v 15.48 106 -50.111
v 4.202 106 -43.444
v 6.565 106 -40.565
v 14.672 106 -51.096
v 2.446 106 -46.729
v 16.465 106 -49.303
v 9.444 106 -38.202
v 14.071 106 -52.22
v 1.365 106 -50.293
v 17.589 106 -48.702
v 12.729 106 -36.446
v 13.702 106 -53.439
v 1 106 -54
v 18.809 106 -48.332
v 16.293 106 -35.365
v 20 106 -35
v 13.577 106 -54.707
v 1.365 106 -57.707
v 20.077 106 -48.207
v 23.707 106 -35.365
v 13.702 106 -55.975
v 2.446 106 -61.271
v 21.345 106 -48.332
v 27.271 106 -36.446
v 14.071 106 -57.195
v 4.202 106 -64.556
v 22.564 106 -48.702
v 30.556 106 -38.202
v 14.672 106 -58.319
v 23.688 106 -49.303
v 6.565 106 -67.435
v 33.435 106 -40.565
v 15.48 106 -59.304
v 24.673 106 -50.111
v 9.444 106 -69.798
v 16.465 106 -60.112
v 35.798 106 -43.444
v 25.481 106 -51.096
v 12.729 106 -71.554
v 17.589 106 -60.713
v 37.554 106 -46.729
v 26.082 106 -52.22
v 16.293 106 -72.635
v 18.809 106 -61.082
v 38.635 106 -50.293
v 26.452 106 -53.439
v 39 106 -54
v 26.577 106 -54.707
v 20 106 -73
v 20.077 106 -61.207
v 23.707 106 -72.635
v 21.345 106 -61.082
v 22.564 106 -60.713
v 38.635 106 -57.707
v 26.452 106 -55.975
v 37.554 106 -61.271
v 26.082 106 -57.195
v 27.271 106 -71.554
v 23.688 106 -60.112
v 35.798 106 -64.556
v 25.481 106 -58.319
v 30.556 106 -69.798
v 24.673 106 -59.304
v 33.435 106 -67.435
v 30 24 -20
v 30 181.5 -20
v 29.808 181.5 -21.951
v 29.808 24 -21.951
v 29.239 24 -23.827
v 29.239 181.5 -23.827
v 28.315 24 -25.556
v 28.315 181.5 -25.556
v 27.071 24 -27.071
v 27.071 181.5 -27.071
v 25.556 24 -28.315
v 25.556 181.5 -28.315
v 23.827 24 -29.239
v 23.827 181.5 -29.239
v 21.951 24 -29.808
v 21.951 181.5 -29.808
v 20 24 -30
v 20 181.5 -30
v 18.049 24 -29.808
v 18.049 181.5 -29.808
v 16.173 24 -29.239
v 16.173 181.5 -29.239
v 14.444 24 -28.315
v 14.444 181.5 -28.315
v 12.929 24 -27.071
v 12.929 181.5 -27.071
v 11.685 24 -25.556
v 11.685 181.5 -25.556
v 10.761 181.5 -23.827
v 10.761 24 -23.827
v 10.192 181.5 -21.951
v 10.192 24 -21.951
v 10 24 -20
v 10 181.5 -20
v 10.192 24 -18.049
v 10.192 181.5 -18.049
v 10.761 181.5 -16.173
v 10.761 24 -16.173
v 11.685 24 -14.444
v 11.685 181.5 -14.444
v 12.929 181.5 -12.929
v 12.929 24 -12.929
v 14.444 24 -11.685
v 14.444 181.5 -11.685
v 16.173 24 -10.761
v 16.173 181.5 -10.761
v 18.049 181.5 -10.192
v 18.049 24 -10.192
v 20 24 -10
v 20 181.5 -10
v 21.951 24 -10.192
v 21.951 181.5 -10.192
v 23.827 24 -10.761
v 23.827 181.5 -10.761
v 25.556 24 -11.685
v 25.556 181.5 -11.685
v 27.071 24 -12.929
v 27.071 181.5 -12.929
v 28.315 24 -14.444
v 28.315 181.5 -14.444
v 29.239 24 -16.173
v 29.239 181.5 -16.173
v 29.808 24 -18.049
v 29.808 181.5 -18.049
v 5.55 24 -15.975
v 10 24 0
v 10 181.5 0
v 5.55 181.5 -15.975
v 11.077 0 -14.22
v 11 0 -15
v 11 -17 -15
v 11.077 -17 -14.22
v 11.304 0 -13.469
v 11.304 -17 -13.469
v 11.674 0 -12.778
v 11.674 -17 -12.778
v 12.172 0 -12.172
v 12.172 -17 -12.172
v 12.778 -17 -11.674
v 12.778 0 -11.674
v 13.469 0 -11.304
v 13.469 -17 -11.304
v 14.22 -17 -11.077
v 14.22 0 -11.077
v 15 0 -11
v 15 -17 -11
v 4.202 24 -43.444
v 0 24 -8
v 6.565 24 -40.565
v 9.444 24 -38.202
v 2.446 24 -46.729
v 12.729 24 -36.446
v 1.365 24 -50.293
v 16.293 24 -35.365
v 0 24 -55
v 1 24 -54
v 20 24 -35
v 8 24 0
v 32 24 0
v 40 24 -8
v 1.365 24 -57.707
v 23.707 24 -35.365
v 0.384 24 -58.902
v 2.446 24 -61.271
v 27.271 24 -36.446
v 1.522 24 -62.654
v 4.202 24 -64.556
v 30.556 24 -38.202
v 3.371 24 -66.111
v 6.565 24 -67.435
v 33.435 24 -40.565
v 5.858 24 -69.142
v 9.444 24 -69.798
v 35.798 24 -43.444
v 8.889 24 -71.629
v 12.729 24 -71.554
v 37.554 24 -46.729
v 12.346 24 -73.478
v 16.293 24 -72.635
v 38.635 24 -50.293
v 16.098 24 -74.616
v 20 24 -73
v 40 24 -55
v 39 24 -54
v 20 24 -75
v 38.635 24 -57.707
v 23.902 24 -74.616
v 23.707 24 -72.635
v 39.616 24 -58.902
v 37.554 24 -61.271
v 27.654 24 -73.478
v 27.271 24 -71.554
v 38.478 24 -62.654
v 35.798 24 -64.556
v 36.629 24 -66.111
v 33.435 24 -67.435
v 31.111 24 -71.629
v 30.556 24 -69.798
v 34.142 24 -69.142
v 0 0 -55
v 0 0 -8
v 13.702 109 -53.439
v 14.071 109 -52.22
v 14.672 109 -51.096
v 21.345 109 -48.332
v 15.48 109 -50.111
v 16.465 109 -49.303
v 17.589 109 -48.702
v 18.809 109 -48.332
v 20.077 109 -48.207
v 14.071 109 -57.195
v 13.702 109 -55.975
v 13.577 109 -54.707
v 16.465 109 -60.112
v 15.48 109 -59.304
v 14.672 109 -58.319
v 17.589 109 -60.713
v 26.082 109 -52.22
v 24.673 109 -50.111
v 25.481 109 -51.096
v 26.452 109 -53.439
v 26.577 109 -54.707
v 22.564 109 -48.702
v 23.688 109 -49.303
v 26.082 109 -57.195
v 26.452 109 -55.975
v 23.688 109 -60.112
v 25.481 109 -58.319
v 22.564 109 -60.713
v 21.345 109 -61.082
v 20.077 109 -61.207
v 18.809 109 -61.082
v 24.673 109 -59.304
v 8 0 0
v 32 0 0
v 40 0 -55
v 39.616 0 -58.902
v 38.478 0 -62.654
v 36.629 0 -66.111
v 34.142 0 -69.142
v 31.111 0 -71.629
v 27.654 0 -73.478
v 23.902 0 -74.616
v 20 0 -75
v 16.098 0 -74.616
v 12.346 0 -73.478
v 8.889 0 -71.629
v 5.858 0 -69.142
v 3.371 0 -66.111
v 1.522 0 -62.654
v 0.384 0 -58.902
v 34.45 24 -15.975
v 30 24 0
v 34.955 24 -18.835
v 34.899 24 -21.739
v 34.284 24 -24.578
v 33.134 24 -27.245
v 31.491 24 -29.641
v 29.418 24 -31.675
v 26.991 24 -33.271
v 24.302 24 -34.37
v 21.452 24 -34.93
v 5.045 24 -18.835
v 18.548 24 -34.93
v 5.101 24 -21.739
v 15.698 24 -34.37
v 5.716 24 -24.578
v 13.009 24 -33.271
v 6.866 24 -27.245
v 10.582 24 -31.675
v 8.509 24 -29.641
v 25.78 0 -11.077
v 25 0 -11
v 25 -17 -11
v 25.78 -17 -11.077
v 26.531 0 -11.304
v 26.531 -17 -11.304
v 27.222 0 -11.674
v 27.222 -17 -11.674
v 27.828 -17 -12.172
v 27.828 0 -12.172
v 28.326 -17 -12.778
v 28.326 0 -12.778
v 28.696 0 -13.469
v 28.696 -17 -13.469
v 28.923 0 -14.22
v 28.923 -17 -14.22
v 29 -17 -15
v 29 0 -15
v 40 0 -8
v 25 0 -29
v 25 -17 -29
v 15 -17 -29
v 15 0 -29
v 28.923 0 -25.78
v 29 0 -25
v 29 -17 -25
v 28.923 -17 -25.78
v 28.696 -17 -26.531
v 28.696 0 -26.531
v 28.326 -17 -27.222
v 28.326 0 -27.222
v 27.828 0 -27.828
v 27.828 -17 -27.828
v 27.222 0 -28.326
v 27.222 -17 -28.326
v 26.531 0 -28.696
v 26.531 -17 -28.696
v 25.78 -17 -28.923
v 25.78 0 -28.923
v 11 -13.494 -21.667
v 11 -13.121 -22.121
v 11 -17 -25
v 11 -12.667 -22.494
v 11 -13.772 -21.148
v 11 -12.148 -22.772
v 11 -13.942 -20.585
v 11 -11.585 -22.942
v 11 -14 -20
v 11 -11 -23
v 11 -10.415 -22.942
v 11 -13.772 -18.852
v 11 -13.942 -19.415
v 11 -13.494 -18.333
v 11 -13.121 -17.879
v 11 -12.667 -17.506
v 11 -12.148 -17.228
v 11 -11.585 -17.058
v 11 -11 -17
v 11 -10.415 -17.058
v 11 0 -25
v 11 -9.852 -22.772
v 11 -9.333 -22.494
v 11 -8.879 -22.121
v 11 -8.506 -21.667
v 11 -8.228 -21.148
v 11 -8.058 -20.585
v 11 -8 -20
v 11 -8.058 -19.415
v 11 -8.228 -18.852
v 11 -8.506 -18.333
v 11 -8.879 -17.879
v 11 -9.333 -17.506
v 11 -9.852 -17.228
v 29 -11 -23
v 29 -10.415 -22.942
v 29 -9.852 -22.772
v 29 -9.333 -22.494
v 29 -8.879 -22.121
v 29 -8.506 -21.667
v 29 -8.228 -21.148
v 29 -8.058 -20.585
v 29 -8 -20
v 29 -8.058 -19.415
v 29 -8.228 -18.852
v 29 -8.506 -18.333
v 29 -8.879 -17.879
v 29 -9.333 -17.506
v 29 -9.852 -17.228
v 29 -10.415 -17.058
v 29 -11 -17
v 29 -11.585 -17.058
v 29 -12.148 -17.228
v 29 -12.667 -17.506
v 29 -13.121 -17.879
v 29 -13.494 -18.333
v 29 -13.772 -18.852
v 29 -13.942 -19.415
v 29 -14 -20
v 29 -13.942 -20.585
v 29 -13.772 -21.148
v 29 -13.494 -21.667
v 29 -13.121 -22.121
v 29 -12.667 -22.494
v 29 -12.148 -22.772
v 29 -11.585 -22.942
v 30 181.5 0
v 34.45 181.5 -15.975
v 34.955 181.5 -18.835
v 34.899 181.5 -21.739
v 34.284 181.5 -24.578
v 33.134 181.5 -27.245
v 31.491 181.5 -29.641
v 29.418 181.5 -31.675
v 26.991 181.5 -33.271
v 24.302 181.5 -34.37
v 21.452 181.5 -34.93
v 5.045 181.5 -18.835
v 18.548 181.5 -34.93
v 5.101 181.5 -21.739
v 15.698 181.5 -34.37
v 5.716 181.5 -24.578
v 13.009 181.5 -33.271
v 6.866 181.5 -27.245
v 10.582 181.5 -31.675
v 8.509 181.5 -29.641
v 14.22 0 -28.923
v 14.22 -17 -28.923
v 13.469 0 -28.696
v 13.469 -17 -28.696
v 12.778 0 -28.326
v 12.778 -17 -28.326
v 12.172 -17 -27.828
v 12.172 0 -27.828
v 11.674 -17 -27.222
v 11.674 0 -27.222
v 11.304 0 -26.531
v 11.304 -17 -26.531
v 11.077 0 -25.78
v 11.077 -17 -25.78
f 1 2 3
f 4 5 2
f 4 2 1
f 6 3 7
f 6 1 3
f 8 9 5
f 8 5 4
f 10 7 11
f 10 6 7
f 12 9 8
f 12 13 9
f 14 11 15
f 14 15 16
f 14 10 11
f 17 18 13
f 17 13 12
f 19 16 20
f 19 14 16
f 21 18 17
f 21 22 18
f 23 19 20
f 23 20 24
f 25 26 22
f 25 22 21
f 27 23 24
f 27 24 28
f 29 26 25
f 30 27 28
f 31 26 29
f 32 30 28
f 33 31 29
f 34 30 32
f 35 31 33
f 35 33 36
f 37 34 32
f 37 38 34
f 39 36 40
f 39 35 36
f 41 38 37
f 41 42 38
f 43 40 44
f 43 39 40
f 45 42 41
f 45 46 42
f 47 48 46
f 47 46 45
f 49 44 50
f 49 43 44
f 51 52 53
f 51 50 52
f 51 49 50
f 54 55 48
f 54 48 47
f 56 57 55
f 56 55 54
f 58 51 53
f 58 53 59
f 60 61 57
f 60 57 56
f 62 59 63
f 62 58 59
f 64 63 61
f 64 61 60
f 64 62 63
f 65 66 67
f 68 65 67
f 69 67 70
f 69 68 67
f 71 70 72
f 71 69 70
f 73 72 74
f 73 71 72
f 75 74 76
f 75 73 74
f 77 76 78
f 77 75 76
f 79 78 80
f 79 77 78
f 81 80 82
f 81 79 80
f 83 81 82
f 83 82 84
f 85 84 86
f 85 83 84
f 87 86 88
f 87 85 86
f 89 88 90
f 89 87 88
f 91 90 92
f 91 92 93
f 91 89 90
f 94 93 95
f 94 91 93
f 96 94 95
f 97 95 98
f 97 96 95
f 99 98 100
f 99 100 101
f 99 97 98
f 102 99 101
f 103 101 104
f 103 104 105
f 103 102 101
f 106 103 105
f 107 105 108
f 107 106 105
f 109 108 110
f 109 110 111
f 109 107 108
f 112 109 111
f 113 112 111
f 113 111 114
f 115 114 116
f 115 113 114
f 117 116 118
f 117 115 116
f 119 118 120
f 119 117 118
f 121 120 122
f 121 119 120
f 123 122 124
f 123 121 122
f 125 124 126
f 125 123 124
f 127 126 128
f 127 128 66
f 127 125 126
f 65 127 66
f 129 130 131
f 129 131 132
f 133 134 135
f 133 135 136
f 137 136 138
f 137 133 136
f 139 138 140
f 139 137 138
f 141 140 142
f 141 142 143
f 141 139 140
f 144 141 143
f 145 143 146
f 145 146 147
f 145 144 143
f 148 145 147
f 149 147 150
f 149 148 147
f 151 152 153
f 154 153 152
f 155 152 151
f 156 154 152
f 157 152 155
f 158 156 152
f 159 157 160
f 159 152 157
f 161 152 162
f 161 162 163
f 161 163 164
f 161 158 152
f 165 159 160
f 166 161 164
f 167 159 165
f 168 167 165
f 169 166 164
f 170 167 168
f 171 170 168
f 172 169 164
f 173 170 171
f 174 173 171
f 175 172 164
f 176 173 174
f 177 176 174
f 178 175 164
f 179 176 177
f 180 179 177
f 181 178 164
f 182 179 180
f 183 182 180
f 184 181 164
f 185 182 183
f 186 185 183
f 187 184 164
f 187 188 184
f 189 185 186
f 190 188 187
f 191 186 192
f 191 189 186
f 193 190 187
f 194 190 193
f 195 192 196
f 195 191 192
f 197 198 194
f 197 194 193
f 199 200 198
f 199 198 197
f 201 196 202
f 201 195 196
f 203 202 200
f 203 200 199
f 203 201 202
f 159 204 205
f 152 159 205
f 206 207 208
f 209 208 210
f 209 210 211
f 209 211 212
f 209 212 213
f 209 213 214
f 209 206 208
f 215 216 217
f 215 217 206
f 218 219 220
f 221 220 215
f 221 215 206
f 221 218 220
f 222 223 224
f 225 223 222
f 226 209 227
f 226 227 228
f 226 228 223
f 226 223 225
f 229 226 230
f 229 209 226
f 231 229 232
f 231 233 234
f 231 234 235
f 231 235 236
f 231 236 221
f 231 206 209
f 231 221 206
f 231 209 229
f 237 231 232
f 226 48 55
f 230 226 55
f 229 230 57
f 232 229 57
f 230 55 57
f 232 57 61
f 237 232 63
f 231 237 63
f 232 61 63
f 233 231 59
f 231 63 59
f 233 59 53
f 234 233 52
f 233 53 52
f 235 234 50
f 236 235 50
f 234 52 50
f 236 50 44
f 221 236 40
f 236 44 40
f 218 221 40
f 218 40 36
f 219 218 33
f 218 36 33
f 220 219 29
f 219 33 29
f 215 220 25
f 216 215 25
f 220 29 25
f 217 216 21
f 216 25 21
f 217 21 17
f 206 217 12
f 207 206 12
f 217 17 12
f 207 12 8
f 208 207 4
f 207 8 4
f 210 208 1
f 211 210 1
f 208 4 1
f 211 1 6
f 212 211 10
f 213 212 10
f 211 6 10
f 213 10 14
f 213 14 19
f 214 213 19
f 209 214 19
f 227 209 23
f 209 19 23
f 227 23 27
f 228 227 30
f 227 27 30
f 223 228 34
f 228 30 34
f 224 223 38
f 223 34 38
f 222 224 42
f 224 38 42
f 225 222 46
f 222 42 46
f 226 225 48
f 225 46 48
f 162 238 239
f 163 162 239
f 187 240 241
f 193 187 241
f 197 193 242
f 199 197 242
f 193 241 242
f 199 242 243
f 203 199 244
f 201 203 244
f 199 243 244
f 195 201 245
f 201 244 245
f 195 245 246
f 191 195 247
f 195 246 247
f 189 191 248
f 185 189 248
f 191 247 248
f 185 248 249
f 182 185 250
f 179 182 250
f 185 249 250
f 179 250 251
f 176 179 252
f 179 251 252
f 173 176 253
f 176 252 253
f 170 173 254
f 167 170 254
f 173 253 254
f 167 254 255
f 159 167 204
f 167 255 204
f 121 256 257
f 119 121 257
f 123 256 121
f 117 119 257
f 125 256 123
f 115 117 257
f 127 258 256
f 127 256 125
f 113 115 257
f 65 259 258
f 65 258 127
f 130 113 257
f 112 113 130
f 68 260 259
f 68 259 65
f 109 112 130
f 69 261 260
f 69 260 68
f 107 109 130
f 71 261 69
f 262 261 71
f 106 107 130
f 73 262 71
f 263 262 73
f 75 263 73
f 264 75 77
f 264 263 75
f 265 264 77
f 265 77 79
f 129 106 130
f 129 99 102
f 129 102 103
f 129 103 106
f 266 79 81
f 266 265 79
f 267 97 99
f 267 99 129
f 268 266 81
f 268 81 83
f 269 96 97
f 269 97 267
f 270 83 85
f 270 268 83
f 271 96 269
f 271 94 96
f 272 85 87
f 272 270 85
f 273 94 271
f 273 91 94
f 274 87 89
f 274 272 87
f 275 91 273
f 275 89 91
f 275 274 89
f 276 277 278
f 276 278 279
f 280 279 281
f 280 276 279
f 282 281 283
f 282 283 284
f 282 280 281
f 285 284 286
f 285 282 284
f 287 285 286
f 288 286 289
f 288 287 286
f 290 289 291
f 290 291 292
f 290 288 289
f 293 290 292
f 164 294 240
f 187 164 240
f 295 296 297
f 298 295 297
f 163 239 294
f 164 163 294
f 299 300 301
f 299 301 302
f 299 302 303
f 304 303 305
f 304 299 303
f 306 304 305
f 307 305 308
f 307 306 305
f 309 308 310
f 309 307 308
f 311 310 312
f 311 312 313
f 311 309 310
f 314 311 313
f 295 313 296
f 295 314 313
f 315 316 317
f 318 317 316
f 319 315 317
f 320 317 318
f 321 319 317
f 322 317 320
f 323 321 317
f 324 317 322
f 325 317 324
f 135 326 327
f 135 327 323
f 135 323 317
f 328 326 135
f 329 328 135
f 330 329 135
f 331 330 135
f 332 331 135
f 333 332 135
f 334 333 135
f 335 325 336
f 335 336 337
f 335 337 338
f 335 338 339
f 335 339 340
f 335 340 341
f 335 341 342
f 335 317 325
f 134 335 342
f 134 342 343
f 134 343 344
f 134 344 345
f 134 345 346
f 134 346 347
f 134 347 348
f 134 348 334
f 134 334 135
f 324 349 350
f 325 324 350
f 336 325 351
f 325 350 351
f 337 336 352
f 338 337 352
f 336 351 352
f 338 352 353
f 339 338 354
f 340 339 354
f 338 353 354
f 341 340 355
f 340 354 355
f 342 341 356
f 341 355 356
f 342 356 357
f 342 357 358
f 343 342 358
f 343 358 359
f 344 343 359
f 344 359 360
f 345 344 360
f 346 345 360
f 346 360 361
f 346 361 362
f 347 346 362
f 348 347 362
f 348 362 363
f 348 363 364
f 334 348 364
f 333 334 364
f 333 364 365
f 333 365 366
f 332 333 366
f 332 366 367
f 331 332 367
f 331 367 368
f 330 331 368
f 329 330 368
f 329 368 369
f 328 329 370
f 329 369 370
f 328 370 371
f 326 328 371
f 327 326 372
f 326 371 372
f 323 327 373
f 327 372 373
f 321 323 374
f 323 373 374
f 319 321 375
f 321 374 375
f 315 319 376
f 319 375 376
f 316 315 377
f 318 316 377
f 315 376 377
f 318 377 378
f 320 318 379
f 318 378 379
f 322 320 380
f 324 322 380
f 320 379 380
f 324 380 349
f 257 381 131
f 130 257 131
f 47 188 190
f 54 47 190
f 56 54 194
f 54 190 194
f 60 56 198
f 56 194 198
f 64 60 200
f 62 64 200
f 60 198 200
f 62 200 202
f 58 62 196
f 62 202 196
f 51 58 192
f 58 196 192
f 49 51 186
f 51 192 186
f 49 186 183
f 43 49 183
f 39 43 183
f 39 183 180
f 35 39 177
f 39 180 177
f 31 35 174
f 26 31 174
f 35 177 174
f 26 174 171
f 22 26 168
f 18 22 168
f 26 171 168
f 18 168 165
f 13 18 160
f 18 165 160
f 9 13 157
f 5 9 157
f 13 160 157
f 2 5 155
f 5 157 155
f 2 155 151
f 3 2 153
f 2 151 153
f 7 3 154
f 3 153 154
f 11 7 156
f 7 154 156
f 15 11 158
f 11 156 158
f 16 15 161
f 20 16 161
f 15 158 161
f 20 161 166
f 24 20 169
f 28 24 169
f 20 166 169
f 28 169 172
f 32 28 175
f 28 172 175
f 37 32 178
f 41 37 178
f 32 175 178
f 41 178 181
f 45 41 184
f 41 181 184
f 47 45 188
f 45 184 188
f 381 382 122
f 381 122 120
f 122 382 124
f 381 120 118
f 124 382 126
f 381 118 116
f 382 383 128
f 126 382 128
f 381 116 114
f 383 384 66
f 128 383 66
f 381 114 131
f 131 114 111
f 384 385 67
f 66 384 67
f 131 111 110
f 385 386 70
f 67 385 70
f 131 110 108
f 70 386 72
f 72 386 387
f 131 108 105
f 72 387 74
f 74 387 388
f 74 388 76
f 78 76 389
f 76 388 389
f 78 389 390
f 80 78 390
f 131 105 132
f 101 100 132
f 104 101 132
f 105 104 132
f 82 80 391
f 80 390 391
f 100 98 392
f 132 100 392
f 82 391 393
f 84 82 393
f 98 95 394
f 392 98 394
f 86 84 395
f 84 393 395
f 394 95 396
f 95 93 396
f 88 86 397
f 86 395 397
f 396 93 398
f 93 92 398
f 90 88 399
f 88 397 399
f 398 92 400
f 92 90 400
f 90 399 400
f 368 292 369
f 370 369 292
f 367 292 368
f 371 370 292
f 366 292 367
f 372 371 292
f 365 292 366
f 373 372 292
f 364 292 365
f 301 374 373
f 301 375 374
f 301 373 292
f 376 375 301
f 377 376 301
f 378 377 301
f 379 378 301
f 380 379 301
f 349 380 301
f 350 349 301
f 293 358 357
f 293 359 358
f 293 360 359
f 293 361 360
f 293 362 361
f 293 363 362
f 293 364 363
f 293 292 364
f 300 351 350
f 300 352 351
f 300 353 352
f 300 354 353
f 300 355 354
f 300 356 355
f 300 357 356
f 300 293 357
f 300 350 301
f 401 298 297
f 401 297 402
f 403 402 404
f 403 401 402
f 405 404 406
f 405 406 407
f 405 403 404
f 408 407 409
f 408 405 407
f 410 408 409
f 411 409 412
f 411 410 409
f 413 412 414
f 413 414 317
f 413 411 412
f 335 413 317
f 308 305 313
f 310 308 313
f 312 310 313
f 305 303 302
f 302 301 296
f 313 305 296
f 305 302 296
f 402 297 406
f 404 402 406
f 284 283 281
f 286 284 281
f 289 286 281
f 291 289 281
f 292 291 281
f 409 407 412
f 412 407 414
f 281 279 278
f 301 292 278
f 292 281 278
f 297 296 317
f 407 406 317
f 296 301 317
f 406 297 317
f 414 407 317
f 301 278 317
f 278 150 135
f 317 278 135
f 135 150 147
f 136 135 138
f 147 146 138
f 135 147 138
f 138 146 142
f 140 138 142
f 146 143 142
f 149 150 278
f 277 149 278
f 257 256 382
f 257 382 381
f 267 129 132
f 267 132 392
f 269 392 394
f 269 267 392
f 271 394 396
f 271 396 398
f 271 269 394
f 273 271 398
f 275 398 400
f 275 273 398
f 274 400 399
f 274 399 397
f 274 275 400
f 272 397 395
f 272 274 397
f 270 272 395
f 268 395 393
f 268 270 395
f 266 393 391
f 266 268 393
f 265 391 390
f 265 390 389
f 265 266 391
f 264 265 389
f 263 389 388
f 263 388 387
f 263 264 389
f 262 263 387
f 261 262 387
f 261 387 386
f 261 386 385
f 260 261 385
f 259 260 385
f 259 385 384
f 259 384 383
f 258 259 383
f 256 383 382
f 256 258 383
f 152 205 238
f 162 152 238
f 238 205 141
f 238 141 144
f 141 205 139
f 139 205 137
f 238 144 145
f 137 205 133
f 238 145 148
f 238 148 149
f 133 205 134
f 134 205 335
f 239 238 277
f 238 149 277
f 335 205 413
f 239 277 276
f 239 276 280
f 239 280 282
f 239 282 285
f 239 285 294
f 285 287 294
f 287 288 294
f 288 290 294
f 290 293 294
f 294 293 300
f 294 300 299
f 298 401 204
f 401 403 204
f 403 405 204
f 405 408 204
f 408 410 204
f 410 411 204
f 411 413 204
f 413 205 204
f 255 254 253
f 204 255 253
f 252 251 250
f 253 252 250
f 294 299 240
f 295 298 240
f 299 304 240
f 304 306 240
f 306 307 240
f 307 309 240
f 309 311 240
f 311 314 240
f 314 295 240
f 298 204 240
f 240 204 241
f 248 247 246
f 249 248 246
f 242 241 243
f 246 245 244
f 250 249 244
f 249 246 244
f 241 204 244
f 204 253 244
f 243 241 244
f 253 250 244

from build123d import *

# Parameters (mm, degrees)
EXTRUDE_1_DEPTH          = 24
EXTRUDE_2_DEPTH          = 17
SKETCH_3_R               = 3
CUT_EXTRUDE_1_DEPTH      = 12
CUT_EXTRUDE_1_DEPTH_BACK = 30
SKETCH_4_R               = 19
EXTRUDE_3_DEPTH          = 82
SKETCH_5_R               = 6.5
EXTRUDE_4_DEPTH          = 3
SKETCH_6_R               = 10
EXTRUDE_7_DEPTH          = 157.5


with BuildPart() as part:
    # 草图1 → 凸台-拉伸1 (new body)
    with BuildSketch(Plane(origin=(0, 0, 0), x_dir=(1, 0, 0), z_dir=(0, 1, 0))):
        with BuildLine():
            Line((0, 8), (8, 0))
            Line((8, 0), (32, 0))
            Line((32, 0), (40, 8))
            Line((40, 8), (40, 55))
            ThreePointArc((40, 55), (20, 75), (0, 55))
            Line((0, 55), (0, 8))
        make_face()
    extrude(amount=EXTRUDE_1_DEPTH)

    # 草图2 → 凸台-拉伸2 (add)
    with BuildSketch(Plane.XZ):
        with BuildLine():
            Line((15, -11), (25, -11))
            ThreePointArc((25, -11), (27.828427125, -12.171572875), (29, -15))
            Line((29, -15), (29, -25))
            ThreePointArc((29, -25), (27.828427125, -27.828427125), (25, -29))
            Line((25, -29), (15, -29))
            ThreePointArc((15, -29), (12.171572875, -27.828427125), (11, -25))
            Line((11, -25), (11, -15))
            ThreePointArc((11, -15), (12.171572875, -12.171572875), (15, -11))
        make_face()
    extrude(amount=EXTRUDE_2_DEPTH)

    # 草图3 → 切除-拉伸1 (cut, two sides)
    with BuildSketch(Plane(origin=(29, 0, 0), x_dir=(0, 0, -1), z_dir=(1, 0, 0))) as cut_extrude_1_sk:
        with Locations((20, -11)):
            Circle(SKETCH_3_R)
    extrude(amount=CUT_EXTRUDE_1_DEPTH, mode=Mode.SUBTRACT)
    extrude(cut_extrude_1_sk.sketch, amount=-CUT_EXTRUDE_1_DEPTH_BACK, mode=Mode.SUBTRACT)

    # 草图4 → 凸台-拉伸3 (add)
    with BuildSketch(Plane(origin=(0, 24, 0), x_dir=(1, 0, 0), z_dir=(0, 1, 0))):
        with Locations((20, 54)):
            Circle(SKETCH_4_R)
    extrude(amount=EXTRUDE_3_DEPTH)

    # 草图5 → 凸台-拉伸4 (add)
    with BuildSketch(Plane(origin=(0, 106, 0), x_dir=(1, 0, 0), z_dir=(0, 1, 0))):
        with Locations((20.076647574, 54.707380465)):
            Circle(SKETCH_5_R)
    extrude(amount=EXTRUDE_4_DEPTH)


with BuildPart() as body_2:
    # 草图6 → 凸台-拉伸7 (new body)
    with BuildSketch(Plane(origin=(0, 24, 0), x_dir=(1, 0, 0), z_dir=(0, 1, 0))):
        with BuildLine():
            Line((10, 0), (5.550125629, 15.974937186))
            ThreePointArc((5.550125629, 15.974937186), (20, 35), (34.449874371, 15.974937186))
            Line((34.449874371, 15.974937186), (30, 0))
            Line((30, 0), (10, 0))
        make_face()
        with Locations((20, 20)):
            Circle(SKETCH_6_R, mode=Mode.SUBTRACT)
    extrude(amount=EXTRUDE_7_DEPTH)


solid = Compound([part.part, body_2.part])
